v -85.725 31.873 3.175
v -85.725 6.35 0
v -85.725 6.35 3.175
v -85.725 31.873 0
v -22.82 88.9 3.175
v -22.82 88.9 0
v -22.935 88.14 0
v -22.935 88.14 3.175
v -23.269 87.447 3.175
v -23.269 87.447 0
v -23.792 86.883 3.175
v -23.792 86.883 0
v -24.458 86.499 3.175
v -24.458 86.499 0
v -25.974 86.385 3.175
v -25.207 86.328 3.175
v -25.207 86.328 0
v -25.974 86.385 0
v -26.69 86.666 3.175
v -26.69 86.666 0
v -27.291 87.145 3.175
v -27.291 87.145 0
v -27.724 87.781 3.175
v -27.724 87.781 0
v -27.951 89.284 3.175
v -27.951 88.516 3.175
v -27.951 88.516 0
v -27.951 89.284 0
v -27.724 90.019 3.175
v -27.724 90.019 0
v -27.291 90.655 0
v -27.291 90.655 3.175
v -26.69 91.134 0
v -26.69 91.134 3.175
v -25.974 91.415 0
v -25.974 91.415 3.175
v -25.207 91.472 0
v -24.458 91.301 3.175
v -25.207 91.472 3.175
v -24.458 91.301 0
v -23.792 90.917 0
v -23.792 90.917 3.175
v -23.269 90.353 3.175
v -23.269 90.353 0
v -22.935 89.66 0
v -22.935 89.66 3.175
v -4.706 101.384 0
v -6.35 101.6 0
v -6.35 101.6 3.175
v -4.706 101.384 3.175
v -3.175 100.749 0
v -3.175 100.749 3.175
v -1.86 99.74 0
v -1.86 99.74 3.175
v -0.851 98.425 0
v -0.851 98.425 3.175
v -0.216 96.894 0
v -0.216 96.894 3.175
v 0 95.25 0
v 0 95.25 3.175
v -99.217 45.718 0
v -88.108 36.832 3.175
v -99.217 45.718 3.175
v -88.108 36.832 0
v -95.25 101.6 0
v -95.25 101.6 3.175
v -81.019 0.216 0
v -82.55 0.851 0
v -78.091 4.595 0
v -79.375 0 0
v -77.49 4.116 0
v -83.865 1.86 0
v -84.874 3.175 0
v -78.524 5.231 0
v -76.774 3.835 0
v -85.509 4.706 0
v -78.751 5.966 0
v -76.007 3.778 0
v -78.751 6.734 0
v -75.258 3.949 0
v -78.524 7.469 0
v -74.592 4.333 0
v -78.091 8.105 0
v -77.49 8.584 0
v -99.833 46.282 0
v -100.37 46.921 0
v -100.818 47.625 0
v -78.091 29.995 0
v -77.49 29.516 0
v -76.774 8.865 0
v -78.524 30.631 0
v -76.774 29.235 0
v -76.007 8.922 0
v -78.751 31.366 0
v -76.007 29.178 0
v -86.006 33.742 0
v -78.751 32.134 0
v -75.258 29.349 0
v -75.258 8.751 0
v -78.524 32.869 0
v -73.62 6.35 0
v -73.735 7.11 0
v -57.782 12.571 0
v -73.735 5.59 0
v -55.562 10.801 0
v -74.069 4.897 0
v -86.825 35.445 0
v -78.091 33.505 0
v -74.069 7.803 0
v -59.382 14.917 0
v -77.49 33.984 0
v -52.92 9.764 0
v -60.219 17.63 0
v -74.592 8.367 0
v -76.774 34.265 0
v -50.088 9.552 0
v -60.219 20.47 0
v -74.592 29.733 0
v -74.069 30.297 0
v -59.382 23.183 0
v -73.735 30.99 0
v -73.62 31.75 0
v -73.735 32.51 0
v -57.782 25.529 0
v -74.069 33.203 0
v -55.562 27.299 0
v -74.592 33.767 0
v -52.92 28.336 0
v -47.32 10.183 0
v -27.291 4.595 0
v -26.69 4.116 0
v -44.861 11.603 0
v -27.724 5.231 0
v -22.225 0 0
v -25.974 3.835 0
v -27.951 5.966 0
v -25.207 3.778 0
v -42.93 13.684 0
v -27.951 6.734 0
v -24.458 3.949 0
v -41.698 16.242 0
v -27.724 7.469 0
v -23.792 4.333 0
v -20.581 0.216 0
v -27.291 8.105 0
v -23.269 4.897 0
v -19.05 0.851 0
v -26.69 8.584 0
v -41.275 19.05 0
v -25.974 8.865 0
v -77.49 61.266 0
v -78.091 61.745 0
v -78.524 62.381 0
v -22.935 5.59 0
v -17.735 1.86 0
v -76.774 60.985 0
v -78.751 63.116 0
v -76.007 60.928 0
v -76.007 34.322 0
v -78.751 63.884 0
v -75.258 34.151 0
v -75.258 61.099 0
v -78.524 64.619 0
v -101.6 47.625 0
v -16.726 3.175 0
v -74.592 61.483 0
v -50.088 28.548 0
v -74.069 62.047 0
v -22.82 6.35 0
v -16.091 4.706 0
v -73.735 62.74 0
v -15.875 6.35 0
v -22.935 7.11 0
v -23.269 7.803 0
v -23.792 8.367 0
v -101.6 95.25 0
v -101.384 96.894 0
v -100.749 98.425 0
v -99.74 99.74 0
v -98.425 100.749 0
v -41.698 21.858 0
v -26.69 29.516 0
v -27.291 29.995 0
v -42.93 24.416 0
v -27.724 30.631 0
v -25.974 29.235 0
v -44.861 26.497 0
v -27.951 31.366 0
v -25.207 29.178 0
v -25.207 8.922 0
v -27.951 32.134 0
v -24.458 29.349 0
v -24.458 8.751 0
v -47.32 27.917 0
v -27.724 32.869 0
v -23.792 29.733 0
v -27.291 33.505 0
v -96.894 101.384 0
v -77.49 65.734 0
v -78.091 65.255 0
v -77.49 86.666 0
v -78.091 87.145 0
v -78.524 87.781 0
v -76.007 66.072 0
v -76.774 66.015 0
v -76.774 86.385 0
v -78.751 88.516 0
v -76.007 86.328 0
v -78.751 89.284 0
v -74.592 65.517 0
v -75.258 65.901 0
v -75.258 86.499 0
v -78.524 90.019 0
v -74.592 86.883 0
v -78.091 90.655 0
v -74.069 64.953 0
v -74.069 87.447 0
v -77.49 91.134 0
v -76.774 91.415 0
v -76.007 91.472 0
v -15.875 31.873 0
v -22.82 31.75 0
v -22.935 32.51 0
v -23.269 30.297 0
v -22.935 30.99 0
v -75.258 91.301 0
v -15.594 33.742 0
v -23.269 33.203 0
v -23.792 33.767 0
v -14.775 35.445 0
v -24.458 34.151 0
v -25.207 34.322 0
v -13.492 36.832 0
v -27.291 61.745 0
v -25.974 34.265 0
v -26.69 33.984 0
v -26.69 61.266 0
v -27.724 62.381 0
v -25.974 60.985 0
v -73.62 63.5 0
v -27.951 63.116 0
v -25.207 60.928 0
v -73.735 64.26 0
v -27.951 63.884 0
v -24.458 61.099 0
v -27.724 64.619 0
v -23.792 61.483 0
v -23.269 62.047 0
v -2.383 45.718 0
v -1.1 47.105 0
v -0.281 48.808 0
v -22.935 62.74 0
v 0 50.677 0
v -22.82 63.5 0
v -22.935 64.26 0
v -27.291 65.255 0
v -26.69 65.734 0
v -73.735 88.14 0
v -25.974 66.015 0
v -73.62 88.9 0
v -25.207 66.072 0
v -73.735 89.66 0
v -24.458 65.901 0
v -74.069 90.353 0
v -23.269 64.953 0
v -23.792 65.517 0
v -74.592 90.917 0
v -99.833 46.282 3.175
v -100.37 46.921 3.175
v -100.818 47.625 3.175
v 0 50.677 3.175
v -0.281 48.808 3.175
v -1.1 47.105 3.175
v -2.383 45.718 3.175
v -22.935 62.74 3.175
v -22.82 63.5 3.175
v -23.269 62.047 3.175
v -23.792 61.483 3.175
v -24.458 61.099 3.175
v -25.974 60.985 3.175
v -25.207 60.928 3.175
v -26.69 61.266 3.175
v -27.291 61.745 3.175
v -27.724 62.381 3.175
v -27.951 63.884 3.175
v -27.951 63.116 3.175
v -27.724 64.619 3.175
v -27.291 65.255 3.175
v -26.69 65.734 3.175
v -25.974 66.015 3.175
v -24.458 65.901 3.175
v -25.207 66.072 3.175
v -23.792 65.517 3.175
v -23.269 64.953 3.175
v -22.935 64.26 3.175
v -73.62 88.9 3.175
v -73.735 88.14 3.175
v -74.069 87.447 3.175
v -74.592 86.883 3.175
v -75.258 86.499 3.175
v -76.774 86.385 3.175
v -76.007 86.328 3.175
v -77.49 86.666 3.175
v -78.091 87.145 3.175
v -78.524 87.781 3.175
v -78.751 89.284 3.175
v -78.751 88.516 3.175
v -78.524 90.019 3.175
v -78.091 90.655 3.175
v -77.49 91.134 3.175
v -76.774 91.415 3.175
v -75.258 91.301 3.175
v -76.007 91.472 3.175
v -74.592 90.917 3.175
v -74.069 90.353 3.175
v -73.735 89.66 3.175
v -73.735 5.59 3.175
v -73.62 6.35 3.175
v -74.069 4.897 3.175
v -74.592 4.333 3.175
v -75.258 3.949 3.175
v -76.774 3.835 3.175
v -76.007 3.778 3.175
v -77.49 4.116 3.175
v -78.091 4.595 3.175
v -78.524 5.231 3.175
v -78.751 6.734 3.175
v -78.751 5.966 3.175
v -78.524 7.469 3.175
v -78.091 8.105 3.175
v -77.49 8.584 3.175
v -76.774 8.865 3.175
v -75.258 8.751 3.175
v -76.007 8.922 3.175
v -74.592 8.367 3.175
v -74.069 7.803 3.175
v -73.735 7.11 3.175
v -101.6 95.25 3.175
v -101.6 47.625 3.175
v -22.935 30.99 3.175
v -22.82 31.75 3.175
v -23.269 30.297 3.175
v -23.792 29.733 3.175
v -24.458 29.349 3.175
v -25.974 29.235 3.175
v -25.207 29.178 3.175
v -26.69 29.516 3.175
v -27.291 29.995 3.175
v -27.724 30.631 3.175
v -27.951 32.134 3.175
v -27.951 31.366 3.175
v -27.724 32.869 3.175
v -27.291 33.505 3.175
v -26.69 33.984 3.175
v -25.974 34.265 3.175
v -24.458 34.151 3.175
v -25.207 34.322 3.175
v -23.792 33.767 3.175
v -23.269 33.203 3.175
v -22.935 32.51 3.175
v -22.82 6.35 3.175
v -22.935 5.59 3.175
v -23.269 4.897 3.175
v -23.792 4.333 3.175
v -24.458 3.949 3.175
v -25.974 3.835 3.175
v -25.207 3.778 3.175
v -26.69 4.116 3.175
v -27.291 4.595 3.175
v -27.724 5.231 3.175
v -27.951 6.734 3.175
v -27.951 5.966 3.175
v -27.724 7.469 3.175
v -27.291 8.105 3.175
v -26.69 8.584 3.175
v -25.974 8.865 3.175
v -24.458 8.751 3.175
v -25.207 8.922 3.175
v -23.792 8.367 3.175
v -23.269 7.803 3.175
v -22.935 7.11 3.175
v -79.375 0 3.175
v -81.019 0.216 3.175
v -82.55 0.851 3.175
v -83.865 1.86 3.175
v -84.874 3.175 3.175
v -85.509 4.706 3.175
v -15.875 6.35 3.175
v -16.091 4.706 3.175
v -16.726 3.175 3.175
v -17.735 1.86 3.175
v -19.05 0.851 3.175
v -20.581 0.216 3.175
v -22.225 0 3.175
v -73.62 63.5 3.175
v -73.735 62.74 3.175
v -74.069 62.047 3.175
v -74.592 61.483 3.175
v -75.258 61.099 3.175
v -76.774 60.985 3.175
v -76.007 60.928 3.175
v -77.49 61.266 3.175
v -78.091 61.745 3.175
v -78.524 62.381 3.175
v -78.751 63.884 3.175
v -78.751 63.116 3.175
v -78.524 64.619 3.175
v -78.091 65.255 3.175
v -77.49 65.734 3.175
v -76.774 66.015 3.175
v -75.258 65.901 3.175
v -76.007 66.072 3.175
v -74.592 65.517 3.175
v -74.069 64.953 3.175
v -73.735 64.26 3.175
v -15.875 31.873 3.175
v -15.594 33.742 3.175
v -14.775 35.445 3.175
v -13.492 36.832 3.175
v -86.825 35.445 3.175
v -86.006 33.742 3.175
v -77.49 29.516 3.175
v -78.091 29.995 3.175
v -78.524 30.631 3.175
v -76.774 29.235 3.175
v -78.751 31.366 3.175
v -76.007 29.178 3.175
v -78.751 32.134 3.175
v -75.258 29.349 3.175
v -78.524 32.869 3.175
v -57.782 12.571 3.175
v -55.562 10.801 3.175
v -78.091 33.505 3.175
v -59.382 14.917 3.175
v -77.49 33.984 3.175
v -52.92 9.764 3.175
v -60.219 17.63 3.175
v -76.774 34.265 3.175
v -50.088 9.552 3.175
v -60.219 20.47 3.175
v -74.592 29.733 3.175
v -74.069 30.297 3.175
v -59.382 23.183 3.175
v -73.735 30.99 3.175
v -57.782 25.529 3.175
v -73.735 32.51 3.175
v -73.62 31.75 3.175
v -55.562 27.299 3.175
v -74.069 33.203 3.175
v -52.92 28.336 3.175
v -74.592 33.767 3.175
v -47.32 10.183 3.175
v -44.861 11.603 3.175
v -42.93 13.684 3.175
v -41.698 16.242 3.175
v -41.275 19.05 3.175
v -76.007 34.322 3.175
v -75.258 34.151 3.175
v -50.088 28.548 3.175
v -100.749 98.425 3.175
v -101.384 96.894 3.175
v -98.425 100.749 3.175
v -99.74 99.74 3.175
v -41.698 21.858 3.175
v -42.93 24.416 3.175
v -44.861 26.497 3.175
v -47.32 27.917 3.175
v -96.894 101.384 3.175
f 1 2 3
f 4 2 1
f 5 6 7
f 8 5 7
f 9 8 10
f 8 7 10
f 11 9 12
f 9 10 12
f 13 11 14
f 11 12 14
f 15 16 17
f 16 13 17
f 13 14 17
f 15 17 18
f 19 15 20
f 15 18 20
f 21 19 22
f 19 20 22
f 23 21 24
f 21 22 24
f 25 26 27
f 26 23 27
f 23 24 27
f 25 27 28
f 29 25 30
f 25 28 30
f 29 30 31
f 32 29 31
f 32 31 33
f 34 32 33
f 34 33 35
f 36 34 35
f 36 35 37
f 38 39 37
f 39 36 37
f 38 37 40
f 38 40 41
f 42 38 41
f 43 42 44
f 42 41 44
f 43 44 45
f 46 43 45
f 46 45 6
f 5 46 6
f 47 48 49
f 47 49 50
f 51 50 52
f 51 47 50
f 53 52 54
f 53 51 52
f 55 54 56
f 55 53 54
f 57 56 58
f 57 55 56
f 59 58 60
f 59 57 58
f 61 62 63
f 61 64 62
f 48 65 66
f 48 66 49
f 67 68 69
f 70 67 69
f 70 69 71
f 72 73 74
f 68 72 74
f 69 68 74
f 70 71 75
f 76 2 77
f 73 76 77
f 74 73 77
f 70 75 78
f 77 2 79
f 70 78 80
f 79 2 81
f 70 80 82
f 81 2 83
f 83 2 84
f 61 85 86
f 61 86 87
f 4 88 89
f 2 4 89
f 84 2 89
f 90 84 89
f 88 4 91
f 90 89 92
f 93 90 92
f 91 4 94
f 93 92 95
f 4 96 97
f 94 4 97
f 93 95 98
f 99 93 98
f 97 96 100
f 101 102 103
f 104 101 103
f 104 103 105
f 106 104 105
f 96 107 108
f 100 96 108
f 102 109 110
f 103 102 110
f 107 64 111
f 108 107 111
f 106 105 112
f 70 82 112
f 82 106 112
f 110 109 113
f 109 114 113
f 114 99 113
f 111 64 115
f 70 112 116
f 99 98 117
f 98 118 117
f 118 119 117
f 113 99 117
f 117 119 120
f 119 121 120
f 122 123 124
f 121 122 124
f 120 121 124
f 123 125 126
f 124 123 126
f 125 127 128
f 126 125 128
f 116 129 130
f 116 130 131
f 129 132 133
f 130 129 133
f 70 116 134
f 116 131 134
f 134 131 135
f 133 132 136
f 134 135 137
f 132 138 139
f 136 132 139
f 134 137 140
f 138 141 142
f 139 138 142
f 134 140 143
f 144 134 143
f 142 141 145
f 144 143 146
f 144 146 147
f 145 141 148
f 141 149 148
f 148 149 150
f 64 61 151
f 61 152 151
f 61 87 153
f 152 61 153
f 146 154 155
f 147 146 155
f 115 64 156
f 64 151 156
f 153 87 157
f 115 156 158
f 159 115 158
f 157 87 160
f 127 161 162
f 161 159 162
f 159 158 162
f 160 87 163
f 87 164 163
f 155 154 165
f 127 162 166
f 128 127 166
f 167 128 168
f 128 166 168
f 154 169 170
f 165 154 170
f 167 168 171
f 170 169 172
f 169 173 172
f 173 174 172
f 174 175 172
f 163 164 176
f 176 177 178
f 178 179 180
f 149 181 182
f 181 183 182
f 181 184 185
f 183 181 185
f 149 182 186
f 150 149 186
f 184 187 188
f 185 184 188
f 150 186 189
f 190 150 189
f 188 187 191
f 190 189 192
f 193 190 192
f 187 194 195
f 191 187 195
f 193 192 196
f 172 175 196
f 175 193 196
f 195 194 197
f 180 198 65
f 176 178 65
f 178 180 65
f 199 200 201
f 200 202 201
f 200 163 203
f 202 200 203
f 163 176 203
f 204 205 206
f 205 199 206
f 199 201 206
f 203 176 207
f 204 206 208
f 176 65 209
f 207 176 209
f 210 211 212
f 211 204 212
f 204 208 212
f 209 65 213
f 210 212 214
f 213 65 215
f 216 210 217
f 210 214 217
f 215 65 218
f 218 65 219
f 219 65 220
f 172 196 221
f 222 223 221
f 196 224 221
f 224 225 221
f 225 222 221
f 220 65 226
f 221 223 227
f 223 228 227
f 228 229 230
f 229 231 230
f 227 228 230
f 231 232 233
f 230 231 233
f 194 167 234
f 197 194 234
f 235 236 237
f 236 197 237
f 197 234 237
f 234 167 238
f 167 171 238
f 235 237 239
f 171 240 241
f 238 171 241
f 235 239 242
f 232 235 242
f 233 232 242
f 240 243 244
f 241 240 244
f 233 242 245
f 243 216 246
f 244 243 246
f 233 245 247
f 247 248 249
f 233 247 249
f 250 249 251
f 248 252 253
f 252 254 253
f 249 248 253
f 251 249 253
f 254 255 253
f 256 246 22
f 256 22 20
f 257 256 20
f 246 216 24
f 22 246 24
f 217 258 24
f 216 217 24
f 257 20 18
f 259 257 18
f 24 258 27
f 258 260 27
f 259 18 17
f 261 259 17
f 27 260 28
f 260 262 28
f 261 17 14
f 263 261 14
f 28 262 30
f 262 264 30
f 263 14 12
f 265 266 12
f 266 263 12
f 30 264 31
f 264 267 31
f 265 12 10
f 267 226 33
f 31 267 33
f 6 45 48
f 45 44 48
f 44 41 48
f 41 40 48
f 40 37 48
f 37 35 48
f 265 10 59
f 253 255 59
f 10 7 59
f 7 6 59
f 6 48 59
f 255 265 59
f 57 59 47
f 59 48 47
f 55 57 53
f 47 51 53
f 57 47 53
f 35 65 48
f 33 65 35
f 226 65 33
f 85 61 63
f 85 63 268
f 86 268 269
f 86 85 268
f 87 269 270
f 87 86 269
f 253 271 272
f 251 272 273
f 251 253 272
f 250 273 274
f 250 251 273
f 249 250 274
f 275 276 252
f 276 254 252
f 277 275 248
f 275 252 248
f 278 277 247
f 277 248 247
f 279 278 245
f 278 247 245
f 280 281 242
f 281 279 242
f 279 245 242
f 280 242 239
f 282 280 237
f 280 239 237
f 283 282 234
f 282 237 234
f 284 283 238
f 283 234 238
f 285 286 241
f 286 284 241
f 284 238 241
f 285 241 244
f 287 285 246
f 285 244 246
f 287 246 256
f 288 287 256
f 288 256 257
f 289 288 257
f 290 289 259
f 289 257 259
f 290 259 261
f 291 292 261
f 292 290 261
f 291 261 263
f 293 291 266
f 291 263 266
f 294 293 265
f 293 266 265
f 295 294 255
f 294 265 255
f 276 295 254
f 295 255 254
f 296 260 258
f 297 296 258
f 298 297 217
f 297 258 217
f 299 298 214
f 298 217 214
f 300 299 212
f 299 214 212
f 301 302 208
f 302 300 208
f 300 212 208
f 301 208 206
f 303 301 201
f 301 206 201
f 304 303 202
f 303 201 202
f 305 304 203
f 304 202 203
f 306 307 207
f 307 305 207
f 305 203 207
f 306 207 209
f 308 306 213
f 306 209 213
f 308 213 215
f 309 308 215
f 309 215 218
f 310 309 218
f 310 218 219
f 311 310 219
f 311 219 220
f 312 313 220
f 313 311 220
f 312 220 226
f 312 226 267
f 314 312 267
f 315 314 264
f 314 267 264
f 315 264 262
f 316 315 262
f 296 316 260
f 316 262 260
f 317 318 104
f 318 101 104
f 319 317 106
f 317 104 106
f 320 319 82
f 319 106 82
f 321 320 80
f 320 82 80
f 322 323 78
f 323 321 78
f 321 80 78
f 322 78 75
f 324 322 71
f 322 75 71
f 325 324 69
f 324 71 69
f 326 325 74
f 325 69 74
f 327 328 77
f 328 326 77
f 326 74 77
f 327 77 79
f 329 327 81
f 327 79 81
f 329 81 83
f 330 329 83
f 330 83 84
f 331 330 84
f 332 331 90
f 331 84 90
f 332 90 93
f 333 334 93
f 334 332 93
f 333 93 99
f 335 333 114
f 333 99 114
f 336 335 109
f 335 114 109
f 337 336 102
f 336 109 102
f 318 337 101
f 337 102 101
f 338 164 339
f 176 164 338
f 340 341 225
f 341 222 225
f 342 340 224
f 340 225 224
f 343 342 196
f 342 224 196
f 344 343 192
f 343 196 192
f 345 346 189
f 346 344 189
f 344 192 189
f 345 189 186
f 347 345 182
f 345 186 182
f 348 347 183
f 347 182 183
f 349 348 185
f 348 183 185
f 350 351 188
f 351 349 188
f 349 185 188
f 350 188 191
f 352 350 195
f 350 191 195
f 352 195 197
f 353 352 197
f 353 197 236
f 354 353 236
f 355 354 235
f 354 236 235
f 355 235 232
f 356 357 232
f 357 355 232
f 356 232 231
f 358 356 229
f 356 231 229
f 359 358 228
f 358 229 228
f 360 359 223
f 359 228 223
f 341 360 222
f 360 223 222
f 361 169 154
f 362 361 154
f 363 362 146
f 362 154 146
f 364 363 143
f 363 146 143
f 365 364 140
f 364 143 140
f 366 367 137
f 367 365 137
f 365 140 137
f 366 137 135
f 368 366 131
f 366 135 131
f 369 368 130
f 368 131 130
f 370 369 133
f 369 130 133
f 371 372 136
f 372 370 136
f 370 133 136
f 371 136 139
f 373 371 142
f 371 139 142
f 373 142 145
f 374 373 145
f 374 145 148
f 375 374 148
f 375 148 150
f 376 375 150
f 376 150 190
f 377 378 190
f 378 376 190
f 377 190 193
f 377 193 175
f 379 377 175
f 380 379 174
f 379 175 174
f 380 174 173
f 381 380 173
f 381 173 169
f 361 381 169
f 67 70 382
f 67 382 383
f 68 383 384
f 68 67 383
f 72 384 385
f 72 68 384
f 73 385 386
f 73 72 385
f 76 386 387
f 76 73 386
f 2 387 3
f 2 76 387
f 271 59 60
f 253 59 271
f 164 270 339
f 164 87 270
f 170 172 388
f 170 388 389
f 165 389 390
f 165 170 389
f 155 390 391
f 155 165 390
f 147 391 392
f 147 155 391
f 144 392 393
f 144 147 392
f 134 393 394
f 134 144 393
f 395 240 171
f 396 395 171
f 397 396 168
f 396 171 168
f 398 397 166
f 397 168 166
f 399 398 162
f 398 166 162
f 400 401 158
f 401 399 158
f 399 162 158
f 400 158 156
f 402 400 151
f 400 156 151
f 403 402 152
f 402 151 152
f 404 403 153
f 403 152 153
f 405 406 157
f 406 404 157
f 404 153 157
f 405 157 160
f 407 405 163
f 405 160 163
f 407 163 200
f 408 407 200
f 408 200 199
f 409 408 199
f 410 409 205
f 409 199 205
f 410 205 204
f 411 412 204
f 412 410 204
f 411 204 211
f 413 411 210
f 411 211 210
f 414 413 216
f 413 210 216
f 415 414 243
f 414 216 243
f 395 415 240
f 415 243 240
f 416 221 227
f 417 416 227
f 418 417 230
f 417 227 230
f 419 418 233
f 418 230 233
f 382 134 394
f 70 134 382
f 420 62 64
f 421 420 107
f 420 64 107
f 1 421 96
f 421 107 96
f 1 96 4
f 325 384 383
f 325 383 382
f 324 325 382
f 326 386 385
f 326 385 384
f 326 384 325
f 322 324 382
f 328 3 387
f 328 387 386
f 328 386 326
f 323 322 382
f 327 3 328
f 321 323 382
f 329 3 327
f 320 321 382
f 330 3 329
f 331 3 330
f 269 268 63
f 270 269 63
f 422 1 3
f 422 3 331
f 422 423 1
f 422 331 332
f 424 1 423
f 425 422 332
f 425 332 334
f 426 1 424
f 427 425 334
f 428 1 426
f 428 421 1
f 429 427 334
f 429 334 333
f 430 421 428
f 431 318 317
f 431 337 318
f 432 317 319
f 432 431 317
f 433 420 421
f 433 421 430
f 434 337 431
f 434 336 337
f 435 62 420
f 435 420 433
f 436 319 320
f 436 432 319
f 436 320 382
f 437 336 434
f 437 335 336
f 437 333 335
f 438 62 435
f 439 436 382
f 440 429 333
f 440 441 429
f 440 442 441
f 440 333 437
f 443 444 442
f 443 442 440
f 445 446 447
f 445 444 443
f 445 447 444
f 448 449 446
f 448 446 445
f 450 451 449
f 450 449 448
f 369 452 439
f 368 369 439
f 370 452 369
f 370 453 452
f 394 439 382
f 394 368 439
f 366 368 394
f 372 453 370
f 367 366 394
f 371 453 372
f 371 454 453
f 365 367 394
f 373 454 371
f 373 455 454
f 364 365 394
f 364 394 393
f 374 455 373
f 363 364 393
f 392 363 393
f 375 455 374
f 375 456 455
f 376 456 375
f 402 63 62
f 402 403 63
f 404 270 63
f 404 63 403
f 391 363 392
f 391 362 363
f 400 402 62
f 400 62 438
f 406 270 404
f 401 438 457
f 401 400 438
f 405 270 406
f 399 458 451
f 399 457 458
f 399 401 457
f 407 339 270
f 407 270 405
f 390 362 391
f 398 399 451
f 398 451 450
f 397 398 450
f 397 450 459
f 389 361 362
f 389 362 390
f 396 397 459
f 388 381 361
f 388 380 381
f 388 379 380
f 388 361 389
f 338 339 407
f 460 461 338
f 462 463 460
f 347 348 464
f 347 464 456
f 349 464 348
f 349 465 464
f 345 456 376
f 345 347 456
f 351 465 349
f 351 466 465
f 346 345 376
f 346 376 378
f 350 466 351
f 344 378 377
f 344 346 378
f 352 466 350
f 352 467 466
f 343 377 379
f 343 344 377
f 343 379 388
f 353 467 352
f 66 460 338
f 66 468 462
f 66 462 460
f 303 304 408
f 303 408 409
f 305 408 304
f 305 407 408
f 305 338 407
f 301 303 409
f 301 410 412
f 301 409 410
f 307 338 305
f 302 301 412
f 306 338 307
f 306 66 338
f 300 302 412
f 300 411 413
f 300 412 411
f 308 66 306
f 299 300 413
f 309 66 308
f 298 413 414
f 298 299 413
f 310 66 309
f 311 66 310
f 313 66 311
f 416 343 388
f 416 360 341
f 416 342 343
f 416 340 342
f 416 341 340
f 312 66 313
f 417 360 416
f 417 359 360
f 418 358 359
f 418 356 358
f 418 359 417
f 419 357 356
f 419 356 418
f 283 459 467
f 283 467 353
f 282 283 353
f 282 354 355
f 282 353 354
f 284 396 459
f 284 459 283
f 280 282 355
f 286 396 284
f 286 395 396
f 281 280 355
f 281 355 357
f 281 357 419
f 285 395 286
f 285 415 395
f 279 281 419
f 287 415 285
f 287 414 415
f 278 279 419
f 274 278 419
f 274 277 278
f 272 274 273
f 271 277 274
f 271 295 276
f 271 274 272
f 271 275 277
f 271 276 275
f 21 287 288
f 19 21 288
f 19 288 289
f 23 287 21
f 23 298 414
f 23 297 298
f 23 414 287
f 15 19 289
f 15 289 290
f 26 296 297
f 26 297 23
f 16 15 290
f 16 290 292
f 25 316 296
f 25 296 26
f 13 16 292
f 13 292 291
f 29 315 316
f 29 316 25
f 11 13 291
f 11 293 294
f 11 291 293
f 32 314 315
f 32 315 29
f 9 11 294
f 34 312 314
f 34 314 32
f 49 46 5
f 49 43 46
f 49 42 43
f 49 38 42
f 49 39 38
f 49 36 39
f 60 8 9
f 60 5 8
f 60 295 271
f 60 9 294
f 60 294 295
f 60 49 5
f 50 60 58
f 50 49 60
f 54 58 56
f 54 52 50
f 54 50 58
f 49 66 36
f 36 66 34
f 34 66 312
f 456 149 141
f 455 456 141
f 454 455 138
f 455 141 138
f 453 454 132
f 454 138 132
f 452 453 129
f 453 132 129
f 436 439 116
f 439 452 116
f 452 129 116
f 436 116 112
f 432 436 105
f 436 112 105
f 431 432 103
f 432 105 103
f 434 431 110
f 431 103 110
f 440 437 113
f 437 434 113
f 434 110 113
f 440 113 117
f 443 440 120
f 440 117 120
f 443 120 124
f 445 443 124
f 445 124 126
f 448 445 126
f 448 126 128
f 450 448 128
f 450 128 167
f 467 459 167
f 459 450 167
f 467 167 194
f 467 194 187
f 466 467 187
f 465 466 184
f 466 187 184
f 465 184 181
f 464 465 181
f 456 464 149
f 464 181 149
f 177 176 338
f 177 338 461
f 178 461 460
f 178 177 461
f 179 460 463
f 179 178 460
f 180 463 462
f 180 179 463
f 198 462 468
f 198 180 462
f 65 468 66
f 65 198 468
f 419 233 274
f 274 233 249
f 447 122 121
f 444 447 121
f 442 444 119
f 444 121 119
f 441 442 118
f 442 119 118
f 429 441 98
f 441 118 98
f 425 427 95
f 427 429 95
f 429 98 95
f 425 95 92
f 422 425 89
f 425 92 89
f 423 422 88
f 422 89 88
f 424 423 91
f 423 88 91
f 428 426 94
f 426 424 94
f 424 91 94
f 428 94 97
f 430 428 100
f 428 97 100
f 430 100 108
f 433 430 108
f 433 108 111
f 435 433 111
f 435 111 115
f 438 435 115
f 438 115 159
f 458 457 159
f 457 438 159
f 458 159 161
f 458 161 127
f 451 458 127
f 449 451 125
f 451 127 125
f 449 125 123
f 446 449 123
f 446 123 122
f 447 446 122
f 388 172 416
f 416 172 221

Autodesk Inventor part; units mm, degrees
ref_plane "YZ Plane" through (0, 0, 0) normal (1, 0, 0) x (0, 1, 0)
ref_plane "XZ Plane" through (0, 0, 0) normal (0, 1, 0) x (-1, 0, 0)
ref_plane "XY Plane" through (0, 0, 0) normal (0, 0, 1) x (1, 0, 0)
sketch "Sketch1" plane through (0, 0, 0) normal (0, 0, 1) x (1, 0, 0)
  line L0 (0, 0) -> (-101.6, 0)
  line L1 (-101.6, 0) -> (-101.6, 101.6)
  line L2 (-95.25, 101.6) -> (0, 101.6)
  circle A0 centre (-76.2, 88.9) radius 2.5797
  circle A1 centre (-76.2, 63.5) radius 2.5797
  circle A2 centre (-25.4, 88.9) radius 2.5797
  circle A3 centre (-25.4, 63.5) radius 2.5797
  circle A4 centre (-50.8, 19.05) radius 9.525
  circle A5 centre (-76.2, 31.75) radius 2.5797
  circle A6 centre (-76.2, 6.35) radius 2.5797
  circle A7 centre (-25.4, 31.75) radius 2.5797
  circle A8 centre (-25.4, 6.35) radius 2.5797
  line L3 (-22.225, 0) -> (-79.375, 0)
  line L4 (-101.6, 50.677) -> (-101.6, 95.25)
  line L5 (-101.6, 101.6) -> (-6.35, 101.6)
  line L6 (0, 0) -> (-15.875, 0)
  line L7 (-15.875, 6.35) -> (-15.875, 31.873)
  line L8 (-101.6, 0) -> (-85.725, 0)
  line L9 (-85.725, 6.35) -> (-85.725, 31.873)
  line L10 (-85.725, 47.625) -> (-101.6, 47.625)
  line L11 (-101.6, 47.625) -> (-101.6, 0)
  line L12 (-101.6, 47.625) -> (-88.8573, 47.625)
  line L13 (-101.6, 26.0622) -> (-101.6, 47.625)
  line L14 (0, 95.25) -> (0, 50.677)
  line L15 (-15.875, 47.625) -> (0, 47.625)
  line L16 (-15.875, 47.625) -> (0, 47.625)
  line L17 (0, 47.625) -> (0, 34.925)
  line L18 (0, 34.925) -> (-15.875, 34.925)
  line L19 (-15.875, 34.925) -> (-15.875, 47.625)
  line L20 (-85.725, 47.625) -> (-101.6, 47.625)
  line L21 (-101.6, 47.625) -> (-101.6, 34.925)
  line L22 (-101.6, 34.925) -> (-85.725, 34.925)
  line L23 (-85.725, 34.925) -> (-85.725, 47.625)
  line L24 (-101.6, 41.275) -> (-85.725, 41.275)
  line L25 (-13.4918, 36.8315) -> (-2.3832, 45.7185)
  line L26 (-88.1082, 36.8315) -> (-99.2168, 45.7185)
  arc A9 (-101.6, 50.677) -> (-99.2168, 45.7185) centre (-95.25, 50.677) ccw
  arc A10 (-85.725, 31.873) -> (-88.1082, 36.8315) centre (-92.075, 31.873) ccw
  arc A11 (-2.3832, 45.7185) -> (0, 50.677) centre (-6.35, 50.677) ccw
  arc A12 (-13.4918, 36.8315) -> (-15.875, 31.873) centre (-9.525, 31.873) ccw
  arc A13 (-22.225, 0) -> (-15.875, 6.35) centre (-22.225, 6.35) ccw
  arc A14 (-85.725, 6.35) -> (-79.375, 0) centre (-79.375, 6.35) ccw
  arc A15 (0, 95.25) -> (-6.35, 101.6) centre (-6.35, 95.25) ccw
  arc A16 (-95.25, 101.6) -> (-101.6, 95.25) centre (-95.25, 95.25) ccw
  point P0 (0, 101.6)
  point P1 (0, 88.9)
  point P2 (-100.8185, 47.625)
  point P3 (-6.35, 101.6)
  point P4 (-101.6, 95.25)
  point P5 (-95.25, 101.6)
  dimension "d0" = 101.6
  dimension "d1" = 101.6
  dimension "d4" = 25.4
  dimension "d7" = 50.8
  dimension "d10" = 12.7
  dimension "d11" = 25.4
  dimension "d12" = 5.1594
  dimension "d13" = 19.05
  dimension "d14" = 5.1594
  dimension "d17" = 25.4
  dimension "d20" = 50.8
  dimension "d23" = 25.4
  dimension "d24" = 6.35
  dimension "d26" = 50.8
  dimension "d29" = 12.7
  dimension "d30" = 101.6
  dimension "d31" = 101.6
  dimension "d32" = 15.875
  dimension "d34" = 101.6
  dimension "d35" = 12.7
  dimension "d36" = 41.275
  dimension "d37" = 6.35
  dimension "d38" = 6.35
  dimension "d39" = 6.35
  dimension "d40" = 88.8572
  dimension "d41" = 21.5628
  dimension "d42" = 6.35
extrude "Extrusion1" add sketch "Sketch1" along normal blind 3.175 contours L0 A14 L9 A10 L22 L23 L10 A9 L1 A16 L2 A15 L14 A11 L15 L19 L18 A12 L7 A13 | L18 L19 L15 A11 L25 A12 | A10 L26 L24 L23 L22 | L24 L26 A9 L10 L23 | L1 A9 L10
properties part number "Dipper Plate"
